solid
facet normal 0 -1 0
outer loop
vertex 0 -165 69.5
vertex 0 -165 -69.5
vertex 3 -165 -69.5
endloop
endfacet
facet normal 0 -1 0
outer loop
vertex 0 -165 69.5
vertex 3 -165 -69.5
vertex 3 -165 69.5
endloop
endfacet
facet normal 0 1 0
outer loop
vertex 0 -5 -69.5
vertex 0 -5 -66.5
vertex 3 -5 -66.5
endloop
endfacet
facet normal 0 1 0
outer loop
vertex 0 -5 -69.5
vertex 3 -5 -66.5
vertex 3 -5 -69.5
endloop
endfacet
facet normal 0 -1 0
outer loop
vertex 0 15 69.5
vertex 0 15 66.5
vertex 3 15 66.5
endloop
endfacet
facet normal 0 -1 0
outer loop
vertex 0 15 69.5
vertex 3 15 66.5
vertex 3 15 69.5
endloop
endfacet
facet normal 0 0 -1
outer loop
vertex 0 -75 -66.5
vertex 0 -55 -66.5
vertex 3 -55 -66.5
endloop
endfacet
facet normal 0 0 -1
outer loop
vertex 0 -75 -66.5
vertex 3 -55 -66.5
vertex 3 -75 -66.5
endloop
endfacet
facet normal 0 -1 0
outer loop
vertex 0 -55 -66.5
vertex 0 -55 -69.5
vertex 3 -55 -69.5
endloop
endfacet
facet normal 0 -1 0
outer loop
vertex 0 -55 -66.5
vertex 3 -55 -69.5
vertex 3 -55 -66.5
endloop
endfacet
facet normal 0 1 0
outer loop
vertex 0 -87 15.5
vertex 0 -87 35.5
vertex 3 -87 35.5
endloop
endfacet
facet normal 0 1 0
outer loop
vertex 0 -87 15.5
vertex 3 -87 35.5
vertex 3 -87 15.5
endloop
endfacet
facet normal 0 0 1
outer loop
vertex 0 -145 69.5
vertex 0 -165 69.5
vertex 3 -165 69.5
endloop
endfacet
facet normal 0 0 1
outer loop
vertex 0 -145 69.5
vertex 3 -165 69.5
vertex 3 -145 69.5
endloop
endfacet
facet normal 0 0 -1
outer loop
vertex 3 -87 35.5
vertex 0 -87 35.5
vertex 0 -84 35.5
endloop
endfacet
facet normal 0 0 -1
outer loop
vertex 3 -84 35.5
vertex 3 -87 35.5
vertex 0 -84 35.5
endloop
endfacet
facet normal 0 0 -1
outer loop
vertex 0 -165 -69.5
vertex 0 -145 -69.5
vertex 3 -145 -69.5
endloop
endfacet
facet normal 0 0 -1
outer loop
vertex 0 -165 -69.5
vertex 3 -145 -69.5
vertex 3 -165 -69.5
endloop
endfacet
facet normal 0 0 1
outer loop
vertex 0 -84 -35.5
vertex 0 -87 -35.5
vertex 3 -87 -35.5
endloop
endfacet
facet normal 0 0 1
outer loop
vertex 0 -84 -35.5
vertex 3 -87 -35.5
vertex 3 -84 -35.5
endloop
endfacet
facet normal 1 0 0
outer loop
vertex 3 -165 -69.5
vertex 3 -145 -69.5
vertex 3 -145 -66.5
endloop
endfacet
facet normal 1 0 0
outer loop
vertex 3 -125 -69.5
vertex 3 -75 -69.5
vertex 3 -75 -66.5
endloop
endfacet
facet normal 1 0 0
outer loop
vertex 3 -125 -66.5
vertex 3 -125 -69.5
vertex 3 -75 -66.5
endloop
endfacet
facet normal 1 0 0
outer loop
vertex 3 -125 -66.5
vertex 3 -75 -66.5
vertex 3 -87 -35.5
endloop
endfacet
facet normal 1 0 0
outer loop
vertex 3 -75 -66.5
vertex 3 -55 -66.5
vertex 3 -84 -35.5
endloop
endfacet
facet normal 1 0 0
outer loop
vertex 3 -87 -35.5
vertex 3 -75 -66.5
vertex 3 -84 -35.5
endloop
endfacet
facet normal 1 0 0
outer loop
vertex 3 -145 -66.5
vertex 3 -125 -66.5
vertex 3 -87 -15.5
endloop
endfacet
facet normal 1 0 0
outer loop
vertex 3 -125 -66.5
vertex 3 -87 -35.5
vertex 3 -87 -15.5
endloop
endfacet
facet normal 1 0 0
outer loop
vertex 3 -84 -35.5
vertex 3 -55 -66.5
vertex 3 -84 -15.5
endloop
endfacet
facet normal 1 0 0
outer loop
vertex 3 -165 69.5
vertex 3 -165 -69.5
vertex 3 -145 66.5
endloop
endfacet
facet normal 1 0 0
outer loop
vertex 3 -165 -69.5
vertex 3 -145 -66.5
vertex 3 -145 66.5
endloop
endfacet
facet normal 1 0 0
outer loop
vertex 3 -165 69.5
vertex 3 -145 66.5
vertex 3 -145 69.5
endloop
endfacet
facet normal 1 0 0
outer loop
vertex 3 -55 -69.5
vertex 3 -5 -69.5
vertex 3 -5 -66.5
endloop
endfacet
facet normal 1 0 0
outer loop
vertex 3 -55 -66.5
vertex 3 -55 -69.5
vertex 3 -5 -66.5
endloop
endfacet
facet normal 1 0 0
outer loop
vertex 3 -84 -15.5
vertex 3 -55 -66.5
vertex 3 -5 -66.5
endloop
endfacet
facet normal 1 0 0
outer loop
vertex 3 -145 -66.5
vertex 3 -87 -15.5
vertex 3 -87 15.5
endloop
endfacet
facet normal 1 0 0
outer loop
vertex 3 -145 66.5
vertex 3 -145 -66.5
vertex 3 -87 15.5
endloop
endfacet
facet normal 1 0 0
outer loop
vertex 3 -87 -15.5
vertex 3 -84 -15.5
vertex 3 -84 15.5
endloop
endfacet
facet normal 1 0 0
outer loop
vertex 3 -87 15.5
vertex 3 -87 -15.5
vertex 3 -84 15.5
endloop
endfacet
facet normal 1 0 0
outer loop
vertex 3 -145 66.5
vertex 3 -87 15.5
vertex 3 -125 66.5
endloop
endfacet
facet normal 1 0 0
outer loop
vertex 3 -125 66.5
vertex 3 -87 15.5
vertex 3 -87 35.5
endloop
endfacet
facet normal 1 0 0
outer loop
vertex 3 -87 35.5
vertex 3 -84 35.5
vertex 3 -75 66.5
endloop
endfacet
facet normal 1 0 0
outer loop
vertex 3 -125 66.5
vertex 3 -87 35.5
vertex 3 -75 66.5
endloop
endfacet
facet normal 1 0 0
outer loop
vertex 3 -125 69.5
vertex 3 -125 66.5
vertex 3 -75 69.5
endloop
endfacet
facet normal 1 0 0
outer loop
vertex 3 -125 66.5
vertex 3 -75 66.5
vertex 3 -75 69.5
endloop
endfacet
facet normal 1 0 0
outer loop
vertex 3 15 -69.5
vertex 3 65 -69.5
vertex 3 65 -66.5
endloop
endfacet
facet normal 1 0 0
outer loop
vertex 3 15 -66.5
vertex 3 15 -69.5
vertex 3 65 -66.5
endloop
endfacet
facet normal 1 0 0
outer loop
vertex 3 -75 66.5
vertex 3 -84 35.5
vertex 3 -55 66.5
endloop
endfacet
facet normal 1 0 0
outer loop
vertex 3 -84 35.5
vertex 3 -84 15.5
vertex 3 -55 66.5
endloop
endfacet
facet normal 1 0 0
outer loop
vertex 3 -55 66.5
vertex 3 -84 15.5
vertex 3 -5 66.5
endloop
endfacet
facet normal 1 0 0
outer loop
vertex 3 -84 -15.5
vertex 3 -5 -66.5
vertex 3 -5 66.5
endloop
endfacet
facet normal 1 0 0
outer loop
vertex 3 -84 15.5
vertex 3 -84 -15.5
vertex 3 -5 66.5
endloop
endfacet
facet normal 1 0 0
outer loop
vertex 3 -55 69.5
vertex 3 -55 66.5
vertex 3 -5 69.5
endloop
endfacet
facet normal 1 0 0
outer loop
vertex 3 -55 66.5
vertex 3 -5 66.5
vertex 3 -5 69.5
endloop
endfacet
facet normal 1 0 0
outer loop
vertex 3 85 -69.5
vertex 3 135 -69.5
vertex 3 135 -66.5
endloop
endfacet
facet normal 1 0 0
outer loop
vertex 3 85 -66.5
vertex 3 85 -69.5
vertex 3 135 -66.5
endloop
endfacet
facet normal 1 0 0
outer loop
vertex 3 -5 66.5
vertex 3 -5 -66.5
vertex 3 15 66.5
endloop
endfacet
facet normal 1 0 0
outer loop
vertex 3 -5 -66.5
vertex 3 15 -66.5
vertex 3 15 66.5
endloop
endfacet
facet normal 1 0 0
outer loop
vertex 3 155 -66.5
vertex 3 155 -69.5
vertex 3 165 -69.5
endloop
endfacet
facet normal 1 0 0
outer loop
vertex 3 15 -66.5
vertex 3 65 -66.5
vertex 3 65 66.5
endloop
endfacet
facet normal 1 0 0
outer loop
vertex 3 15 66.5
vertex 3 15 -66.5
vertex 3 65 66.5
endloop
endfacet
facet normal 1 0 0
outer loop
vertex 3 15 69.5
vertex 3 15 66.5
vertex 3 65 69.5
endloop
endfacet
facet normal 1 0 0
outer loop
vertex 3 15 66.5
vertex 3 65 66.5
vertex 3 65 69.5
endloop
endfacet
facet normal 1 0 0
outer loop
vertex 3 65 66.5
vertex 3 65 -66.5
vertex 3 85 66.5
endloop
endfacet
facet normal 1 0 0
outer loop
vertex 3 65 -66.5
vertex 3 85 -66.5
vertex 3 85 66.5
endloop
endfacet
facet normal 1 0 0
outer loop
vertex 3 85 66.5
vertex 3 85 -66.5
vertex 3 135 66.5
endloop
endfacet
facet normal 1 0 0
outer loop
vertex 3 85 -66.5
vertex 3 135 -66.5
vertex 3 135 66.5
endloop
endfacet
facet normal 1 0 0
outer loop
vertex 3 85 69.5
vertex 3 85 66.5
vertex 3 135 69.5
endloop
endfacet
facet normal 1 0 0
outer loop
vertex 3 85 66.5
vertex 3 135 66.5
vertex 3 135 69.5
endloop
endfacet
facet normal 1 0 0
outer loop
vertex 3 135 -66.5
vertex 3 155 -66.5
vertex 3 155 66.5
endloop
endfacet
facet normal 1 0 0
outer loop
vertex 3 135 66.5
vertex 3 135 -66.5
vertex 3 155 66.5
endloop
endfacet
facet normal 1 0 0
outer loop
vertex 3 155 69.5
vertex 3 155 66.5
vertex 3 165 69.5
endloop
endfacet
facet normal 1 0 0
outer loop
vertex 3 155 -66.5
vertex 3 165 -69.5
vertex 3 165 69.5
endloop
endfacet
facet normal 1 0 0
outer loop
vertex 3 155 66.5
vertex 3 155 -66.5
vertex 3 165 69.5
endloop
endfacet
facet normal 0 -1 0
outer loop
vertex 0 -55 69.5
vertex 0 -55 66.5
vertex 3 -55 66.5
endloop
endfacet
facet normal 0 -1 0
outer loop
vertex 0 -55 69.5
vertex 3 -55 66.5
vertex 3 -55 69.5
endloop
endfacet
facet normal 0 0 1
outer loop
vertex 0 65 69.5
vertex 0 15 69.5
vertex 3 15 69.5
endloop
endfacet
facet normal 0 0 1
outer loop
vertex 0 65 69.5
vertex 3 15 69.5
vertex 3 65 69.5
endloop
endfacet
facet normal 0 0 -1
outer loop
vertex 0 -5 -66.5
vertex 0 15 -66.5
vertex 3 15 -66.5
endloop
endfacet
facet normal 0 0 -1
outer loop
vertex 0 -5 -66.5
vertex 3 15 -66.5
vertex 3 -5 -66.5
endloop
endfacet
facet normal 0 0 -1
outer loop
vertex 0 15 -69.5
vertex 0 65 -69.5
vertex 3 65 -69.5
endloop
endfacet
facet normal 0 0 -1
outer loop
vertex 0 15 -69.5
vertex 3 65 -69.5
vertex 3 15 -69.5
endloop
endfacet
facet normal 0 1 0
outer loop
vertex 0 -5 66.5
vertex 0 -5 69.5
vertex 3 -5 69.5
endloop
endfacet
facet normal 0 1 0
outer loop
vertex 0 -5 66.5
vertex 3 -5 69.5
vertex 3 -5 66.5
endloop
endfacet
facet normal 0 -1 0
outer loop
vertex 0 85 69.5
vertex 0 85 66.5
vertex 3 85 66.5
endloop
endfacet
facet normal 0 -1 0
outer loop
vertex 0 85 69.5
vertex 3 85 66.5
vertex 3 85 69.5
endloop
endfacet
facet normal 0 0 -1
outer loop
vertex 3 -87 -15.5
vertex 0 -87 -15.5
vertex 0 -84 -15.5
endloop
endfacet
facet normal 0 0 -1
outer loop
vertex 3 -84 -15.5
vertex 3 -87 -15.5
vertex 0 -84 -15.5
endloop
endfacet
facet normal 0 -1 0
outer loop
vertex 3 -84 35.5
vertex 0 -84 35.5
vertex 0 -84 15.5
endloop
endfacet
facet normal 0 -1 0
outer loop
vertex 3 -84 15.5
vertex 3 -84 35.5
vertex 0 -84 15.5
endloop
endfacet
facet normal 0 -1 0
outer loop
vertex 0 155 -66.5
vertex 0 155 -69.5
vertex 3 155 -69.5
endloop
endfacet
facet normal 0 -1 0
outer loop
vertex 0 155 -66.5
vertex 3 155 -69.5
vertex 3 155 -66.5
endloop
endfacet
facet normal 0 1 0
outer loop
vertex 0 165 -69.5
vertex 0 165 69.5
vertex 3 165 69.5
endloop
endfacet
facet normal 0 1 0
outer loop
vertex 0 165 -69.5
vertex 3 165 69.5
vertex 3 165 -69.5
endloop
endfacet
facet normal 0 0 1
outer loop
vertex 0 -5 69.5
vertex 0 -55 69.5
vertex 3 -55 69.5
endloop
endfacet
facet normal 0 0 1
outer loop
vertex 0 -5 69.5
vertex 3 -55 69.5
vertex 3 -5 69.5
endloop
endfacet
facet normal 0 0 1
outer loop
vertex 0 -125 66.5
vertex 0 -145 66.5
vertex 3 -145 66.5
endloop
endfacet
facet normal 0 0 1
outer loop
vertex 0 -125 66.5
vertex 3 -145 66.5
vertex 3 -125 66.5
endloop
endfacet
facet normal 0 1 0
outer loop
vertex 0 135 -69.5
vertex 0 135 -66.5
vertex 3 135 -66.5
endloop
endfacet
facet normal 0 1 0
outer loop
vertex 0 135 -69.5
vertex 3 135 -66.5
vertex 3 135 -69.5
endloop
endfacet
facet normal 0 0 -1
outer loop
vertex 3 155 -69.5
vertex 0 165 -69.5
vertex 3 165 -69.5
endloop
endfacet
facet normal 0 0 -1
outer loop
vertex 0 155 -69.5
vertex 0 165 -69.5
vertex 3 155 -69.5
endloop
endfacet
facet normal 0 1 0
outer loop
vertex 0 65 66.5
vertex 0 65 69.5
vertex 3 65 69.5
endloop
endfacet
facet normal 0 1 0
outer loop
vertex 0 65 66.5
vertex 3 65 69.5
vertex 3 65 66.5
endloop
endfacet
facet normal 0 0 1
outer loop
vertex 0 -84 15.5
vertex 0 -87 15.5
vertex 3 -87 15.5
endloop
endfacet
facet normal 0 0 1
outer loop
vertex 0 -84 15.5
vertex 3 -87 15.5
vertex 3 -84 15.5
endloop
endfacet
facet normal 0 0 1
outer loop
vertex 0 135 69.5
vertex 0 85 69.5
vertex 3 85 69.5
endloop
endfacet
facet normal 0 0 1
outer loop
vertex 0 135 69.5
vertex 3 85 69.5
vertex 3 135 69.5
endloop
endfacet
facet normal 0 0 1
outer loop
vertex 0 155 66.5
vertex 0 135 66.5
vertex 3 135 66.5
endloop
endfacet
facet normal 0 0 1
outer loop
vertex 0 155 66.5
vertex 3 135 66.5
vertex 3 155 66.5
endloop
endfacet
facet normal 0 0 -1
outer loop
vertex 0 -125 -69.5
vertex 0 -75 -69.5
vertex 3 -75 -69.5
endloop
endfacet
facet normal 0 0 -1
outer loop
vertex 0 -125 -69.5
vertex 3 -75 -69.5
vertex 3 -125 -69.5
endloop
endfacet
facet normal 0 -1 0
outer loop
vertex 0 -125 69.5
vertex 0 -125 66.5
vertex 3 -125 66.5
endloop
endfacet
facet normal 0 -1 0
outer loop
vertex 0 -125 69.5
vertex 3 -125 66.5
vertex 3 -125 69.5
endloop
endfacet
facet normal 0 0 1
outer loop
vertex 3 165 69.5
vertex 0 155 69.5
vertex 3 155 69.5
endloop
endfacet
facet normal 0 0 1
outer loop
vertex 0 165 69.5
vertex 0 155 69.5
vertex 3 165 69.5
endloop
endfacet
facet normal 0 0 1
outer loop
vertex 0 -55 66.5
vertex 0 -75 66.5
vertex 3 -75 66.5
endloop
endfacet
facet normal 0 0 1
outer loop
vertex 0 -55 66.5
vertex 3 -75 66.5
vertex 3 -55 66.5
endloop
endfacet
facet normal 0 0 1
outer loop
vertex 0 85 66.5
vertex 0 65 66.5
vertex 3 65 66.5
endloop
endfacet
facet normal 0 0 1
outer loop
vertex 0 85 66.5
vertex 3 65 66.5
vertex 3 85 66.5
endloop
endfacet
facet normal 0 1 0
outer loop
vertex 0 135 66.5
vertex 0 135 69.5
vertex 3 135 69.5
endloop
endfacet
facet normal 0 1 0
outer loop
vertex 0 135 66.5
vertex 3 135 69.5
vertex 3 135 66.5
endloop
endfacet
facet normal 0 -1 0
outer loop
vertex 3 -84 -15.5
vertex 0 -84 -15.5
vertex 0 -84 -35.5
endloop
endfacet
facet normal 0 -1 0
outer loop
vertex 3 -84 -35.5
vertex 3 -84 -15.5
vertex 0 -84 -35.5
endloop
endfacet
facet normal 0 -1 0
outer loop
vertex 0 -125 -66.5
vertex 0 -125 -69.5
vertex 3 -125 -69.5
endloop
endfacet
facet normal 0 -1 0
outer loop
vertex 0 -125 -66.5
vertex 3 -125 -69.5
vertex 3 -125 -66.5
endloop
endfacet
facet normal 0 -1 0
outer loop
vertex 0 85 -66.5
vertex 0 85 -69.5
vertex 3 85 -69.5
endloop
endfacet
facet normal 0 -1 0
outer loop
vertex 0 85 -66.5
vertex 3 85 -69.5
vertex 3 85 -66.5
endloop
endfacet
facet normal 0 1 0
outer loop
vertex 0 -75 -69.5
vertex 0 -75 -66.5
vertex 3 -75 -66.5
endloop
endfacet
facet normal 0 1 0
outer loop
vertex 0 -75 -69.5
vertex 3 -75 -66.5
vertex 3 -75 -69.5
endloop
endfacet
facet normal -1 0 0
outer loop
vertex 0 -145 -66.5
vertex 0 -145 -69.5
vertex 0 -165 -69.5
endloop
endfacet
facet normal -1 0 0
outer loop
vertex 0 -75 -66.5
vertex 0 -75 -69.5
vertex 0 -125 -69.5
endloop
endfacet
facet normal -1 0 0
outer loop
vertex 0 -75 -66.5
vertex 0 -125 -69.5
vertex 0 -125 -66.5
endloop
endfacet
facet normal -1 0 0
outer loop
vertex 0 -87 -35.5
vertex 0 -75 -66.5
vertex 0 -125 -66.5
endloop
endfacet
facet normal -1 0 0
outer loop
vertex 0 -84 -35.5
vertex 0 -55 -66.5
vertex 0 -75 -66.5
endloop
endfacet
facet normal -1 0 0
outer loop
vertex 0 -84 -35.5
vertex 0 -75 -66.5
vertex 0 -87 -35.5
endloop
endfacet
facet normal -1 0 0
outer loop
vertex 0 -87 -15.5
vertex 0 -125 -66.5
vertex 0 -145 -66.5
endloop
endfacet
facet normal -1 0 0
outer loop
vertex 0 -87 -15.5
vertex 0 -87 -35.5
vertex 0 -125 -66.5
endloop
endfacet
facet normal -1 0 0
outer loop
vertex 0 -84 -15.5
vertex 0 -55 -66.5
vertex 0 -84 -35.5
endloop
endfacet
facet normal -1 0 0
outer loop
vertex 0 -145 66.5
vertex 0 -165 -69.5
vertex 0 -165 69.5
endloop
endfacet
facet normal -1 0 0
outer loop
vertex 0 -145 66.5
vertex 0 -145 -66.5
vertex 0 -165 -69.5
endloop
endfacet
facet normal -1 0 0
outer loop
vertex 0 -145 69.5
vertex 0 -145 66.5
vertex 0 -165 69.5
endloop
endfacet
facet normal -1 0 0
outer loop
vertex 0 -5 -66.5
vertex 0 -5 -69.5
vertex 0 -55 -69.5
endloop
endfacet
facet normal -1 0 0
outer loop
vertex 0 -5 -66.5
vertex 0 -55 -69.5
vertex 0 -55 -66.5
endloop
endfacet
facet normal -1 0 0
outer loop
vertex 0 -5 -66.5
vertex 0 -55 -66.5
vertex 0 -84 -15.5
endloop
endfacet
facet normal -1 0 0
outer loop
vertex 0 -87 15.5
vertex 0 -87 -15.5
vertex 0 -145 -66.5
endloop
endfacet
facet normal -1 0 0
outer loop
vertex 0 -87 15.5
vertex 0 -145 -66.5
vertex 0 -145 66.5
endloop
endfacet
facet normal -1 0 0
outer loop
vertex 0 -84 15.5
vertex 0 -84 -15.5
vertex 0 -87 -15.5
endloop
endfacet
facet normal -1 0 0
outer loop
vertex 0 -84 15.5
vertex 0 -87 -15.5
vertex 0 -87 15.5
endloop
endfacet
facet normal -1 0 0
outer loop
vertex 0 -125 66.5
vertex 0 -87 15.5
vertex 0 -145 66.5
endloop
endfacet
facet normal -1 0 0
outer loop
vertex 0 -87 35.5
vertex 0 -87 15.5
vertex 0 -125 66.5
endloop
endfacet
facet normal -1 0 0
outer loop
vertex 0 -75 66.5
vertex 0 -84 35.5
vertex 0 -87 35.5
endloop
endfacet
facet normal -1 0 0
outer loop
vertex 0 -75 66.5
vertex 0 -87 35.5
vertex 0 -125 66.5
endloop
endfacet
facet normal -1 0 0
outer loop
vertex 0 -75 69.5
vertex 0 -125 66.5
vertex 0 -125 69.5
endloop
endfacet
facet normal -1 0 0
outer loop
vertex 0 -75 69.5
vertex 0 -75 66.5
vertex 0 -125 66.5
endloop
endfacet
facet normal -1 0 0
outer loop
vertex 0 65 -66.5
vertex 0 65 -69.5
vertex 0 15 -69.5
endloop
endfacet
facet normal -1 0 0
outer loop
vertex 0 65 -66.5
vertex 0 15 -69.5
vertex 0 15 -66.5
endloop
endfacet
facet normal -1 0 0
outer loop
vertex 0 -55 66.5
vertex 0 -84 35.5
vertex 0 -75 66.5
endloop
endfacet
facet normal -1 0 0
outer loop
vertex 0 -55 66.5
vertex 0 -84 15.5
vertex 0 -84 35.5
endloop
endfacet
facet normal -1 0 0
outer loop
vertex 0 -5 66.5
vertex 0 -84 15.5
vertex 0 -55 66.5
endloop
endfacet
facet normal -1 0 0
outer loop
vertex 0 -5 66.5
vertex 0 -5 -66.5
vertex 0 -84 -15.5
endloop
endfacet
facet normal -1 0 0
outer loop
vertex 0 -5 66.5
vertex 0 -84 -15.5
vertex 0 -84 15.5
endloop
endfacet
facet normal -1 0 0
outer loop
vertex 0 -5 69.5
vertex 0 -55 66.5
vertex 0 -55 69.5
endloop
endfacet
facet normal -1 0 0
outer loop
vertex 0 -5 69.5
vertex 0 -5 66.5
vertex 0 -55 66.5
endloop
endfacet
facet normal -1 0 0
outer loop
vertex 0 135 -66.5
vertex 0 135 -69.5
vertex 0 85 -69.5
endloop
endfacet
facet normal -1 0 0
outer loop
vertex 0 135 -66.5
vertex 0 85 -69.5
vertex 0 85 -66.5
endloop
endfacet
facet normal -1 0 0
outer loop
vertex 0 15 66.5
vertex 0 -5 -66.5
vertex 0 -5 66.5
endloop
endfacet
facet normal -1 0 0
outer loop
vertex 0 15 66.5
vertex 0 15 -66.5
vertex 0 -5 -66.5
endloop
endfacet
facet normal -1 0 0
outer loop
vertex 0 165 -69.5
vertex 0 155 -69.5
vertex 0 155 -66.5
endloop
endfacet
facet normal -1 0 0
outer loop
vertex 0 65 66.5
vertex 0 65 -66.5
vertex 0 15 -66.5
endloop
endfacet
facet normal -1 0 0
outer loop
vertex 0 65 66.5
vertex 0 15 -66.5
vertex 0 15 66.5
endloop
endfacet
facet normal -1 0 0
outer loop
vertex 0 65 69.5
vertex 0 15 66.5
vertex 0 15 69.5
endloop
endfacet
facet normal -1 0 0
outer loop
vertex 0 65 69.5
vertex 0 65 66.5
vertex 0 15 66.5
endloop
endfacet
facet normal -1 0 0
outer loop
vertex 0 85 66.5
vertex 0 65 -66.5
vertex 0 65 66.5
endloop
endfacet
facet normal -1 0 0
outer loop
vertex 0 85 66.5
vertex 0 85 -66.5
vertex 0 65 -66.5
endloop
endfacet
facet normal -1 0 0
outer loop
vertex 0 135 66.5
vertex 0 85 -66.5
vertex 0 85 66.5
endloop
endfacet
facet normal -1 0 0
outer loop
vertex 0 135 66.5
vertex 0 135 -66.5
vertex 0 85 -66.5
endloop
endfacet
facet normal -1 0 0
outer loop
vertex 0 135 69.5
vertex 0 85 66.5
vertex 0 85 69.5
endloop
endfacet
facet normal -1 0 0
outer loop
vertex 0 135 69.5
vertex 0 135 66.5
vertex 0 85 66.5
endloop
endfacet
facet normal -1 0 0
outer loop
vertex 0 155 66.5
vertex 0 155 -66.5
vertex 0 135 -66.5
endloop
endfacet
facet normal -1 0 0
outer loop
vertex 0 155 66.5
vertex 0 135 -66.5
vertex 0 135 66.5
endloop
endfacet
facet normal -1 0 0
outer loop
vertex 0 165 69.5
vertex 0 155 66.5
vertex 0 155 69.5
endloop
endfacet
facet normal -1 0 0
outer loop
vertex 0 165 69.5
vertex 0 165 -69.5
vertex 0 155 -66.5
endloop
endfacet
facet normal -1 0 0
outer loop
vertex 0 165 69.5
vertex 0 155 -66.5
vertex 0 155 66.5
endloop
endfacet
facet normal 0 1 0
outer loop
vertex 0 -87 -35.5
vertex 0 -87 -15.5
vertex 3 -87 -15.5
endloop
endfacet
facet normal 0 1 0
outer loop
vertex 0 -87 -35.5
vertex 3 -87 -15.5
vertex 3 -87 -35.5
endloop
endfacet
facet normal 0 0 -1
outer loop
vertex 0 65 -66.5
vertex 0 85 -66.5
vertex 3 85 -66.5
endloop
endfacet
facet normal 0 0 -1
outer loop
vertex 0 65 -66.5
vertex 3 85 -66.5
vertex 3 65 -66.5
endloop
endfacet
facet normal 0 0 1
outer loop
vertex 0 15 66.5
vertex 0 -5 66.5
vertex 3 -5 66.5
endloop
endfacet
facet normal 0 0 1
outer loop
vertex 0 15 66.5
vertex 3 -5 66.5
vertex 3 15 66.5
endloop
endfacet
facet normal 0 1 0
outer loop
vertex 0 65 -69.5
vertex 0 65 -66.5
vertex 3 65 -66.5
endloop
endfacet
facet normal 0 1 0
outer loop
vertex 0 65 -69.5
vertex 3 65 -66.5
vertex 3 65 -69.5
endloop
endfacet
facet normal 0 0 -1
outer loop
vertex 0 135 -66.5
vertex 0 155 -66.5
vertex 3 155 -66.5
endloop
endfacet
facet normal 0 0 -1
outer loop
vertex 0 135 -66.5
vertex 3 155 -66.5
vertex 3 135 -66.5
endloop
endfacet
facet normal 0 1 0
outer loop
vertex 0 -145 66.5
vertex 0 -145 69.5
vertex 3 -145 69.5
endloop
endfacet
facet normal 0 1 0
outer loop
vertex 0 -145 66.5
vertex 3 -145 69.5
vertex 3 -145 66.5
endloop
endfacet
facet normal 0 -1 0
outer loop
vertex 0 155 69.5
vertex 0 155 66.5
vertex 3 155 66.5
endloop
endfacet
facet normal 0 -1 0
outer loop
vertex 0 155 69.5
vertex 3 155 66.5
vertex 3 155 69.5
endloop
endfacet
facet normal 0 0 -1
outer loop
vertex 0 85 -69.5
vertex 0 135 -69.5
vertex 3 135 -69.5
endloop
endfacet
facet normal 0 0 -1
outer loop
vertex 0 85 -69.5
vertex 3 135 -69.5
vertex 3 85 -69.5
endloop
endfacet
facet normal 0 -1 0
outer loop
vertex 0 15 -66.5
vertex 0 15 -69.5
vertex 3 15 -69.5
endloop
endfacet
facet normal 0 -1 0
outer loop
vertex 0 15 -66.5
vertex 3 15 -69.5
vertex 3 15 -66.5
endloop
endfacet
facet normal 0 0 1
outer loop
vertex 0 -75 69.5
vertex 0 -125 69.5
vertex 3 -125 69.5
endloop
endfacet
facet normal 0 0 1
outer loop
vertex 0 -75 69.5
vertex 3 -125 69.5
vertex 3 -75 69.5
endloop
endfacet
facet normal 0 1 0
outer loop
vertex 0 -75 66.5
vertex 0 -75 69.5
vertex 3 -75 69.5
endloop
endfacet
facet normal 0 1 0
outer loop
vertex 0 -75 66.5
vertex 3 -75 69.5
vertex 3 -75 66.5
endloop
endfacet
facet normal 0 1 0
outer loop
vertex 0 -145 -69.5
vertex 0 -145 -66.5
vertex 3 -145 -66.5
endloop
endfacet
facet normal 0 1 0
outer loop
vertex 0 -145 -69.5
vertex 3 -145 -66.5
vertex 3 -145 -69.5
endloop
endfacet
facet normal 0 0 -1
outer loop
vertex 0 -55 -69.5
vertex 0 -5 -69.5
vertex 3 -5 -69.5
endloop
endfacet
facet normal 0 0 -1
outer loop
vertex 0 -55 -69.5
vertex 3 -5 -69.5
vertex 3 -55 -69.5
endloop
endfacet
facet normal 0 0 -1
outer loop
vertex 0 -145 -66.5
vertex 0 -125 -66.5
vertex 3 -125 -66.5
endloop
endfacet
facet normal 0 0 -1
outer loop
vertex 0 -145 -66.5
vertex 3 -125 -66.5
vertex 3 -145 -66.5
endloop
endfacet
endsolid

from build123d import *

# Parameters (mm, degrees)
SKETCH_1_W      = 20
SKETCH_1_H      = 3
EXTRUDE_5_DEPTH = 3


with BuildPart() as part:
    # Эскиз1 → Бобышка-Вытянуть5 (new body)
    with BuildSketch(Plane(origin=(0, 0, 0), x_dir=(0, 0, -1), z_dir=(1, 0, 0))):
        Polygon((-69.5, -165), (-69.5, -145), (-66.5, -145), (-66.5, -125), (-69.5, -125), (-69.5, -75), (-66.5, -75), (-66.5, -55), (-69.5, -55), (-69.5, -5), (-66.5, -5), (-66.5, 15), (-69.5, 15), (-69.5, 65), (-66.5, 65), (-66.5, 85), (-69.5, 85), (-69.5, 135), (-66.5, 135), (-66.5, 155), (-69.5, 155), (-69.5, 165), (69.5, 165), (69.5, 155), (66.5, 155), (66.5, 135), (69.5, 135), (69.5, 85), (66.5, 85), (66.5, 65), (69.5, 65), (69.5, 15), (66.5, 15), (66.5, -5), (69.5, -5), (69.5, -55), (66.5, -55), (66.5, -75), (69.5, -75), (69.5, -125), (66.5, -125), (66.5, -145), (69.5, -145), (69.5, -165), align=None)
        with Locations((25.5, -85.5)):
            Rectangle(SKETCH_1_W, SKETCH_1_H, mode=Mode.SUBTRACT)
        with Locations((-25.5, -85.5)):
            Rectangle(SKETCH_1_W, SKETCH_1_H, mode=Mode.SUBTRACT)
    extrude(amount=EXTRUDE_5_DEPTH)


solid = part.part
